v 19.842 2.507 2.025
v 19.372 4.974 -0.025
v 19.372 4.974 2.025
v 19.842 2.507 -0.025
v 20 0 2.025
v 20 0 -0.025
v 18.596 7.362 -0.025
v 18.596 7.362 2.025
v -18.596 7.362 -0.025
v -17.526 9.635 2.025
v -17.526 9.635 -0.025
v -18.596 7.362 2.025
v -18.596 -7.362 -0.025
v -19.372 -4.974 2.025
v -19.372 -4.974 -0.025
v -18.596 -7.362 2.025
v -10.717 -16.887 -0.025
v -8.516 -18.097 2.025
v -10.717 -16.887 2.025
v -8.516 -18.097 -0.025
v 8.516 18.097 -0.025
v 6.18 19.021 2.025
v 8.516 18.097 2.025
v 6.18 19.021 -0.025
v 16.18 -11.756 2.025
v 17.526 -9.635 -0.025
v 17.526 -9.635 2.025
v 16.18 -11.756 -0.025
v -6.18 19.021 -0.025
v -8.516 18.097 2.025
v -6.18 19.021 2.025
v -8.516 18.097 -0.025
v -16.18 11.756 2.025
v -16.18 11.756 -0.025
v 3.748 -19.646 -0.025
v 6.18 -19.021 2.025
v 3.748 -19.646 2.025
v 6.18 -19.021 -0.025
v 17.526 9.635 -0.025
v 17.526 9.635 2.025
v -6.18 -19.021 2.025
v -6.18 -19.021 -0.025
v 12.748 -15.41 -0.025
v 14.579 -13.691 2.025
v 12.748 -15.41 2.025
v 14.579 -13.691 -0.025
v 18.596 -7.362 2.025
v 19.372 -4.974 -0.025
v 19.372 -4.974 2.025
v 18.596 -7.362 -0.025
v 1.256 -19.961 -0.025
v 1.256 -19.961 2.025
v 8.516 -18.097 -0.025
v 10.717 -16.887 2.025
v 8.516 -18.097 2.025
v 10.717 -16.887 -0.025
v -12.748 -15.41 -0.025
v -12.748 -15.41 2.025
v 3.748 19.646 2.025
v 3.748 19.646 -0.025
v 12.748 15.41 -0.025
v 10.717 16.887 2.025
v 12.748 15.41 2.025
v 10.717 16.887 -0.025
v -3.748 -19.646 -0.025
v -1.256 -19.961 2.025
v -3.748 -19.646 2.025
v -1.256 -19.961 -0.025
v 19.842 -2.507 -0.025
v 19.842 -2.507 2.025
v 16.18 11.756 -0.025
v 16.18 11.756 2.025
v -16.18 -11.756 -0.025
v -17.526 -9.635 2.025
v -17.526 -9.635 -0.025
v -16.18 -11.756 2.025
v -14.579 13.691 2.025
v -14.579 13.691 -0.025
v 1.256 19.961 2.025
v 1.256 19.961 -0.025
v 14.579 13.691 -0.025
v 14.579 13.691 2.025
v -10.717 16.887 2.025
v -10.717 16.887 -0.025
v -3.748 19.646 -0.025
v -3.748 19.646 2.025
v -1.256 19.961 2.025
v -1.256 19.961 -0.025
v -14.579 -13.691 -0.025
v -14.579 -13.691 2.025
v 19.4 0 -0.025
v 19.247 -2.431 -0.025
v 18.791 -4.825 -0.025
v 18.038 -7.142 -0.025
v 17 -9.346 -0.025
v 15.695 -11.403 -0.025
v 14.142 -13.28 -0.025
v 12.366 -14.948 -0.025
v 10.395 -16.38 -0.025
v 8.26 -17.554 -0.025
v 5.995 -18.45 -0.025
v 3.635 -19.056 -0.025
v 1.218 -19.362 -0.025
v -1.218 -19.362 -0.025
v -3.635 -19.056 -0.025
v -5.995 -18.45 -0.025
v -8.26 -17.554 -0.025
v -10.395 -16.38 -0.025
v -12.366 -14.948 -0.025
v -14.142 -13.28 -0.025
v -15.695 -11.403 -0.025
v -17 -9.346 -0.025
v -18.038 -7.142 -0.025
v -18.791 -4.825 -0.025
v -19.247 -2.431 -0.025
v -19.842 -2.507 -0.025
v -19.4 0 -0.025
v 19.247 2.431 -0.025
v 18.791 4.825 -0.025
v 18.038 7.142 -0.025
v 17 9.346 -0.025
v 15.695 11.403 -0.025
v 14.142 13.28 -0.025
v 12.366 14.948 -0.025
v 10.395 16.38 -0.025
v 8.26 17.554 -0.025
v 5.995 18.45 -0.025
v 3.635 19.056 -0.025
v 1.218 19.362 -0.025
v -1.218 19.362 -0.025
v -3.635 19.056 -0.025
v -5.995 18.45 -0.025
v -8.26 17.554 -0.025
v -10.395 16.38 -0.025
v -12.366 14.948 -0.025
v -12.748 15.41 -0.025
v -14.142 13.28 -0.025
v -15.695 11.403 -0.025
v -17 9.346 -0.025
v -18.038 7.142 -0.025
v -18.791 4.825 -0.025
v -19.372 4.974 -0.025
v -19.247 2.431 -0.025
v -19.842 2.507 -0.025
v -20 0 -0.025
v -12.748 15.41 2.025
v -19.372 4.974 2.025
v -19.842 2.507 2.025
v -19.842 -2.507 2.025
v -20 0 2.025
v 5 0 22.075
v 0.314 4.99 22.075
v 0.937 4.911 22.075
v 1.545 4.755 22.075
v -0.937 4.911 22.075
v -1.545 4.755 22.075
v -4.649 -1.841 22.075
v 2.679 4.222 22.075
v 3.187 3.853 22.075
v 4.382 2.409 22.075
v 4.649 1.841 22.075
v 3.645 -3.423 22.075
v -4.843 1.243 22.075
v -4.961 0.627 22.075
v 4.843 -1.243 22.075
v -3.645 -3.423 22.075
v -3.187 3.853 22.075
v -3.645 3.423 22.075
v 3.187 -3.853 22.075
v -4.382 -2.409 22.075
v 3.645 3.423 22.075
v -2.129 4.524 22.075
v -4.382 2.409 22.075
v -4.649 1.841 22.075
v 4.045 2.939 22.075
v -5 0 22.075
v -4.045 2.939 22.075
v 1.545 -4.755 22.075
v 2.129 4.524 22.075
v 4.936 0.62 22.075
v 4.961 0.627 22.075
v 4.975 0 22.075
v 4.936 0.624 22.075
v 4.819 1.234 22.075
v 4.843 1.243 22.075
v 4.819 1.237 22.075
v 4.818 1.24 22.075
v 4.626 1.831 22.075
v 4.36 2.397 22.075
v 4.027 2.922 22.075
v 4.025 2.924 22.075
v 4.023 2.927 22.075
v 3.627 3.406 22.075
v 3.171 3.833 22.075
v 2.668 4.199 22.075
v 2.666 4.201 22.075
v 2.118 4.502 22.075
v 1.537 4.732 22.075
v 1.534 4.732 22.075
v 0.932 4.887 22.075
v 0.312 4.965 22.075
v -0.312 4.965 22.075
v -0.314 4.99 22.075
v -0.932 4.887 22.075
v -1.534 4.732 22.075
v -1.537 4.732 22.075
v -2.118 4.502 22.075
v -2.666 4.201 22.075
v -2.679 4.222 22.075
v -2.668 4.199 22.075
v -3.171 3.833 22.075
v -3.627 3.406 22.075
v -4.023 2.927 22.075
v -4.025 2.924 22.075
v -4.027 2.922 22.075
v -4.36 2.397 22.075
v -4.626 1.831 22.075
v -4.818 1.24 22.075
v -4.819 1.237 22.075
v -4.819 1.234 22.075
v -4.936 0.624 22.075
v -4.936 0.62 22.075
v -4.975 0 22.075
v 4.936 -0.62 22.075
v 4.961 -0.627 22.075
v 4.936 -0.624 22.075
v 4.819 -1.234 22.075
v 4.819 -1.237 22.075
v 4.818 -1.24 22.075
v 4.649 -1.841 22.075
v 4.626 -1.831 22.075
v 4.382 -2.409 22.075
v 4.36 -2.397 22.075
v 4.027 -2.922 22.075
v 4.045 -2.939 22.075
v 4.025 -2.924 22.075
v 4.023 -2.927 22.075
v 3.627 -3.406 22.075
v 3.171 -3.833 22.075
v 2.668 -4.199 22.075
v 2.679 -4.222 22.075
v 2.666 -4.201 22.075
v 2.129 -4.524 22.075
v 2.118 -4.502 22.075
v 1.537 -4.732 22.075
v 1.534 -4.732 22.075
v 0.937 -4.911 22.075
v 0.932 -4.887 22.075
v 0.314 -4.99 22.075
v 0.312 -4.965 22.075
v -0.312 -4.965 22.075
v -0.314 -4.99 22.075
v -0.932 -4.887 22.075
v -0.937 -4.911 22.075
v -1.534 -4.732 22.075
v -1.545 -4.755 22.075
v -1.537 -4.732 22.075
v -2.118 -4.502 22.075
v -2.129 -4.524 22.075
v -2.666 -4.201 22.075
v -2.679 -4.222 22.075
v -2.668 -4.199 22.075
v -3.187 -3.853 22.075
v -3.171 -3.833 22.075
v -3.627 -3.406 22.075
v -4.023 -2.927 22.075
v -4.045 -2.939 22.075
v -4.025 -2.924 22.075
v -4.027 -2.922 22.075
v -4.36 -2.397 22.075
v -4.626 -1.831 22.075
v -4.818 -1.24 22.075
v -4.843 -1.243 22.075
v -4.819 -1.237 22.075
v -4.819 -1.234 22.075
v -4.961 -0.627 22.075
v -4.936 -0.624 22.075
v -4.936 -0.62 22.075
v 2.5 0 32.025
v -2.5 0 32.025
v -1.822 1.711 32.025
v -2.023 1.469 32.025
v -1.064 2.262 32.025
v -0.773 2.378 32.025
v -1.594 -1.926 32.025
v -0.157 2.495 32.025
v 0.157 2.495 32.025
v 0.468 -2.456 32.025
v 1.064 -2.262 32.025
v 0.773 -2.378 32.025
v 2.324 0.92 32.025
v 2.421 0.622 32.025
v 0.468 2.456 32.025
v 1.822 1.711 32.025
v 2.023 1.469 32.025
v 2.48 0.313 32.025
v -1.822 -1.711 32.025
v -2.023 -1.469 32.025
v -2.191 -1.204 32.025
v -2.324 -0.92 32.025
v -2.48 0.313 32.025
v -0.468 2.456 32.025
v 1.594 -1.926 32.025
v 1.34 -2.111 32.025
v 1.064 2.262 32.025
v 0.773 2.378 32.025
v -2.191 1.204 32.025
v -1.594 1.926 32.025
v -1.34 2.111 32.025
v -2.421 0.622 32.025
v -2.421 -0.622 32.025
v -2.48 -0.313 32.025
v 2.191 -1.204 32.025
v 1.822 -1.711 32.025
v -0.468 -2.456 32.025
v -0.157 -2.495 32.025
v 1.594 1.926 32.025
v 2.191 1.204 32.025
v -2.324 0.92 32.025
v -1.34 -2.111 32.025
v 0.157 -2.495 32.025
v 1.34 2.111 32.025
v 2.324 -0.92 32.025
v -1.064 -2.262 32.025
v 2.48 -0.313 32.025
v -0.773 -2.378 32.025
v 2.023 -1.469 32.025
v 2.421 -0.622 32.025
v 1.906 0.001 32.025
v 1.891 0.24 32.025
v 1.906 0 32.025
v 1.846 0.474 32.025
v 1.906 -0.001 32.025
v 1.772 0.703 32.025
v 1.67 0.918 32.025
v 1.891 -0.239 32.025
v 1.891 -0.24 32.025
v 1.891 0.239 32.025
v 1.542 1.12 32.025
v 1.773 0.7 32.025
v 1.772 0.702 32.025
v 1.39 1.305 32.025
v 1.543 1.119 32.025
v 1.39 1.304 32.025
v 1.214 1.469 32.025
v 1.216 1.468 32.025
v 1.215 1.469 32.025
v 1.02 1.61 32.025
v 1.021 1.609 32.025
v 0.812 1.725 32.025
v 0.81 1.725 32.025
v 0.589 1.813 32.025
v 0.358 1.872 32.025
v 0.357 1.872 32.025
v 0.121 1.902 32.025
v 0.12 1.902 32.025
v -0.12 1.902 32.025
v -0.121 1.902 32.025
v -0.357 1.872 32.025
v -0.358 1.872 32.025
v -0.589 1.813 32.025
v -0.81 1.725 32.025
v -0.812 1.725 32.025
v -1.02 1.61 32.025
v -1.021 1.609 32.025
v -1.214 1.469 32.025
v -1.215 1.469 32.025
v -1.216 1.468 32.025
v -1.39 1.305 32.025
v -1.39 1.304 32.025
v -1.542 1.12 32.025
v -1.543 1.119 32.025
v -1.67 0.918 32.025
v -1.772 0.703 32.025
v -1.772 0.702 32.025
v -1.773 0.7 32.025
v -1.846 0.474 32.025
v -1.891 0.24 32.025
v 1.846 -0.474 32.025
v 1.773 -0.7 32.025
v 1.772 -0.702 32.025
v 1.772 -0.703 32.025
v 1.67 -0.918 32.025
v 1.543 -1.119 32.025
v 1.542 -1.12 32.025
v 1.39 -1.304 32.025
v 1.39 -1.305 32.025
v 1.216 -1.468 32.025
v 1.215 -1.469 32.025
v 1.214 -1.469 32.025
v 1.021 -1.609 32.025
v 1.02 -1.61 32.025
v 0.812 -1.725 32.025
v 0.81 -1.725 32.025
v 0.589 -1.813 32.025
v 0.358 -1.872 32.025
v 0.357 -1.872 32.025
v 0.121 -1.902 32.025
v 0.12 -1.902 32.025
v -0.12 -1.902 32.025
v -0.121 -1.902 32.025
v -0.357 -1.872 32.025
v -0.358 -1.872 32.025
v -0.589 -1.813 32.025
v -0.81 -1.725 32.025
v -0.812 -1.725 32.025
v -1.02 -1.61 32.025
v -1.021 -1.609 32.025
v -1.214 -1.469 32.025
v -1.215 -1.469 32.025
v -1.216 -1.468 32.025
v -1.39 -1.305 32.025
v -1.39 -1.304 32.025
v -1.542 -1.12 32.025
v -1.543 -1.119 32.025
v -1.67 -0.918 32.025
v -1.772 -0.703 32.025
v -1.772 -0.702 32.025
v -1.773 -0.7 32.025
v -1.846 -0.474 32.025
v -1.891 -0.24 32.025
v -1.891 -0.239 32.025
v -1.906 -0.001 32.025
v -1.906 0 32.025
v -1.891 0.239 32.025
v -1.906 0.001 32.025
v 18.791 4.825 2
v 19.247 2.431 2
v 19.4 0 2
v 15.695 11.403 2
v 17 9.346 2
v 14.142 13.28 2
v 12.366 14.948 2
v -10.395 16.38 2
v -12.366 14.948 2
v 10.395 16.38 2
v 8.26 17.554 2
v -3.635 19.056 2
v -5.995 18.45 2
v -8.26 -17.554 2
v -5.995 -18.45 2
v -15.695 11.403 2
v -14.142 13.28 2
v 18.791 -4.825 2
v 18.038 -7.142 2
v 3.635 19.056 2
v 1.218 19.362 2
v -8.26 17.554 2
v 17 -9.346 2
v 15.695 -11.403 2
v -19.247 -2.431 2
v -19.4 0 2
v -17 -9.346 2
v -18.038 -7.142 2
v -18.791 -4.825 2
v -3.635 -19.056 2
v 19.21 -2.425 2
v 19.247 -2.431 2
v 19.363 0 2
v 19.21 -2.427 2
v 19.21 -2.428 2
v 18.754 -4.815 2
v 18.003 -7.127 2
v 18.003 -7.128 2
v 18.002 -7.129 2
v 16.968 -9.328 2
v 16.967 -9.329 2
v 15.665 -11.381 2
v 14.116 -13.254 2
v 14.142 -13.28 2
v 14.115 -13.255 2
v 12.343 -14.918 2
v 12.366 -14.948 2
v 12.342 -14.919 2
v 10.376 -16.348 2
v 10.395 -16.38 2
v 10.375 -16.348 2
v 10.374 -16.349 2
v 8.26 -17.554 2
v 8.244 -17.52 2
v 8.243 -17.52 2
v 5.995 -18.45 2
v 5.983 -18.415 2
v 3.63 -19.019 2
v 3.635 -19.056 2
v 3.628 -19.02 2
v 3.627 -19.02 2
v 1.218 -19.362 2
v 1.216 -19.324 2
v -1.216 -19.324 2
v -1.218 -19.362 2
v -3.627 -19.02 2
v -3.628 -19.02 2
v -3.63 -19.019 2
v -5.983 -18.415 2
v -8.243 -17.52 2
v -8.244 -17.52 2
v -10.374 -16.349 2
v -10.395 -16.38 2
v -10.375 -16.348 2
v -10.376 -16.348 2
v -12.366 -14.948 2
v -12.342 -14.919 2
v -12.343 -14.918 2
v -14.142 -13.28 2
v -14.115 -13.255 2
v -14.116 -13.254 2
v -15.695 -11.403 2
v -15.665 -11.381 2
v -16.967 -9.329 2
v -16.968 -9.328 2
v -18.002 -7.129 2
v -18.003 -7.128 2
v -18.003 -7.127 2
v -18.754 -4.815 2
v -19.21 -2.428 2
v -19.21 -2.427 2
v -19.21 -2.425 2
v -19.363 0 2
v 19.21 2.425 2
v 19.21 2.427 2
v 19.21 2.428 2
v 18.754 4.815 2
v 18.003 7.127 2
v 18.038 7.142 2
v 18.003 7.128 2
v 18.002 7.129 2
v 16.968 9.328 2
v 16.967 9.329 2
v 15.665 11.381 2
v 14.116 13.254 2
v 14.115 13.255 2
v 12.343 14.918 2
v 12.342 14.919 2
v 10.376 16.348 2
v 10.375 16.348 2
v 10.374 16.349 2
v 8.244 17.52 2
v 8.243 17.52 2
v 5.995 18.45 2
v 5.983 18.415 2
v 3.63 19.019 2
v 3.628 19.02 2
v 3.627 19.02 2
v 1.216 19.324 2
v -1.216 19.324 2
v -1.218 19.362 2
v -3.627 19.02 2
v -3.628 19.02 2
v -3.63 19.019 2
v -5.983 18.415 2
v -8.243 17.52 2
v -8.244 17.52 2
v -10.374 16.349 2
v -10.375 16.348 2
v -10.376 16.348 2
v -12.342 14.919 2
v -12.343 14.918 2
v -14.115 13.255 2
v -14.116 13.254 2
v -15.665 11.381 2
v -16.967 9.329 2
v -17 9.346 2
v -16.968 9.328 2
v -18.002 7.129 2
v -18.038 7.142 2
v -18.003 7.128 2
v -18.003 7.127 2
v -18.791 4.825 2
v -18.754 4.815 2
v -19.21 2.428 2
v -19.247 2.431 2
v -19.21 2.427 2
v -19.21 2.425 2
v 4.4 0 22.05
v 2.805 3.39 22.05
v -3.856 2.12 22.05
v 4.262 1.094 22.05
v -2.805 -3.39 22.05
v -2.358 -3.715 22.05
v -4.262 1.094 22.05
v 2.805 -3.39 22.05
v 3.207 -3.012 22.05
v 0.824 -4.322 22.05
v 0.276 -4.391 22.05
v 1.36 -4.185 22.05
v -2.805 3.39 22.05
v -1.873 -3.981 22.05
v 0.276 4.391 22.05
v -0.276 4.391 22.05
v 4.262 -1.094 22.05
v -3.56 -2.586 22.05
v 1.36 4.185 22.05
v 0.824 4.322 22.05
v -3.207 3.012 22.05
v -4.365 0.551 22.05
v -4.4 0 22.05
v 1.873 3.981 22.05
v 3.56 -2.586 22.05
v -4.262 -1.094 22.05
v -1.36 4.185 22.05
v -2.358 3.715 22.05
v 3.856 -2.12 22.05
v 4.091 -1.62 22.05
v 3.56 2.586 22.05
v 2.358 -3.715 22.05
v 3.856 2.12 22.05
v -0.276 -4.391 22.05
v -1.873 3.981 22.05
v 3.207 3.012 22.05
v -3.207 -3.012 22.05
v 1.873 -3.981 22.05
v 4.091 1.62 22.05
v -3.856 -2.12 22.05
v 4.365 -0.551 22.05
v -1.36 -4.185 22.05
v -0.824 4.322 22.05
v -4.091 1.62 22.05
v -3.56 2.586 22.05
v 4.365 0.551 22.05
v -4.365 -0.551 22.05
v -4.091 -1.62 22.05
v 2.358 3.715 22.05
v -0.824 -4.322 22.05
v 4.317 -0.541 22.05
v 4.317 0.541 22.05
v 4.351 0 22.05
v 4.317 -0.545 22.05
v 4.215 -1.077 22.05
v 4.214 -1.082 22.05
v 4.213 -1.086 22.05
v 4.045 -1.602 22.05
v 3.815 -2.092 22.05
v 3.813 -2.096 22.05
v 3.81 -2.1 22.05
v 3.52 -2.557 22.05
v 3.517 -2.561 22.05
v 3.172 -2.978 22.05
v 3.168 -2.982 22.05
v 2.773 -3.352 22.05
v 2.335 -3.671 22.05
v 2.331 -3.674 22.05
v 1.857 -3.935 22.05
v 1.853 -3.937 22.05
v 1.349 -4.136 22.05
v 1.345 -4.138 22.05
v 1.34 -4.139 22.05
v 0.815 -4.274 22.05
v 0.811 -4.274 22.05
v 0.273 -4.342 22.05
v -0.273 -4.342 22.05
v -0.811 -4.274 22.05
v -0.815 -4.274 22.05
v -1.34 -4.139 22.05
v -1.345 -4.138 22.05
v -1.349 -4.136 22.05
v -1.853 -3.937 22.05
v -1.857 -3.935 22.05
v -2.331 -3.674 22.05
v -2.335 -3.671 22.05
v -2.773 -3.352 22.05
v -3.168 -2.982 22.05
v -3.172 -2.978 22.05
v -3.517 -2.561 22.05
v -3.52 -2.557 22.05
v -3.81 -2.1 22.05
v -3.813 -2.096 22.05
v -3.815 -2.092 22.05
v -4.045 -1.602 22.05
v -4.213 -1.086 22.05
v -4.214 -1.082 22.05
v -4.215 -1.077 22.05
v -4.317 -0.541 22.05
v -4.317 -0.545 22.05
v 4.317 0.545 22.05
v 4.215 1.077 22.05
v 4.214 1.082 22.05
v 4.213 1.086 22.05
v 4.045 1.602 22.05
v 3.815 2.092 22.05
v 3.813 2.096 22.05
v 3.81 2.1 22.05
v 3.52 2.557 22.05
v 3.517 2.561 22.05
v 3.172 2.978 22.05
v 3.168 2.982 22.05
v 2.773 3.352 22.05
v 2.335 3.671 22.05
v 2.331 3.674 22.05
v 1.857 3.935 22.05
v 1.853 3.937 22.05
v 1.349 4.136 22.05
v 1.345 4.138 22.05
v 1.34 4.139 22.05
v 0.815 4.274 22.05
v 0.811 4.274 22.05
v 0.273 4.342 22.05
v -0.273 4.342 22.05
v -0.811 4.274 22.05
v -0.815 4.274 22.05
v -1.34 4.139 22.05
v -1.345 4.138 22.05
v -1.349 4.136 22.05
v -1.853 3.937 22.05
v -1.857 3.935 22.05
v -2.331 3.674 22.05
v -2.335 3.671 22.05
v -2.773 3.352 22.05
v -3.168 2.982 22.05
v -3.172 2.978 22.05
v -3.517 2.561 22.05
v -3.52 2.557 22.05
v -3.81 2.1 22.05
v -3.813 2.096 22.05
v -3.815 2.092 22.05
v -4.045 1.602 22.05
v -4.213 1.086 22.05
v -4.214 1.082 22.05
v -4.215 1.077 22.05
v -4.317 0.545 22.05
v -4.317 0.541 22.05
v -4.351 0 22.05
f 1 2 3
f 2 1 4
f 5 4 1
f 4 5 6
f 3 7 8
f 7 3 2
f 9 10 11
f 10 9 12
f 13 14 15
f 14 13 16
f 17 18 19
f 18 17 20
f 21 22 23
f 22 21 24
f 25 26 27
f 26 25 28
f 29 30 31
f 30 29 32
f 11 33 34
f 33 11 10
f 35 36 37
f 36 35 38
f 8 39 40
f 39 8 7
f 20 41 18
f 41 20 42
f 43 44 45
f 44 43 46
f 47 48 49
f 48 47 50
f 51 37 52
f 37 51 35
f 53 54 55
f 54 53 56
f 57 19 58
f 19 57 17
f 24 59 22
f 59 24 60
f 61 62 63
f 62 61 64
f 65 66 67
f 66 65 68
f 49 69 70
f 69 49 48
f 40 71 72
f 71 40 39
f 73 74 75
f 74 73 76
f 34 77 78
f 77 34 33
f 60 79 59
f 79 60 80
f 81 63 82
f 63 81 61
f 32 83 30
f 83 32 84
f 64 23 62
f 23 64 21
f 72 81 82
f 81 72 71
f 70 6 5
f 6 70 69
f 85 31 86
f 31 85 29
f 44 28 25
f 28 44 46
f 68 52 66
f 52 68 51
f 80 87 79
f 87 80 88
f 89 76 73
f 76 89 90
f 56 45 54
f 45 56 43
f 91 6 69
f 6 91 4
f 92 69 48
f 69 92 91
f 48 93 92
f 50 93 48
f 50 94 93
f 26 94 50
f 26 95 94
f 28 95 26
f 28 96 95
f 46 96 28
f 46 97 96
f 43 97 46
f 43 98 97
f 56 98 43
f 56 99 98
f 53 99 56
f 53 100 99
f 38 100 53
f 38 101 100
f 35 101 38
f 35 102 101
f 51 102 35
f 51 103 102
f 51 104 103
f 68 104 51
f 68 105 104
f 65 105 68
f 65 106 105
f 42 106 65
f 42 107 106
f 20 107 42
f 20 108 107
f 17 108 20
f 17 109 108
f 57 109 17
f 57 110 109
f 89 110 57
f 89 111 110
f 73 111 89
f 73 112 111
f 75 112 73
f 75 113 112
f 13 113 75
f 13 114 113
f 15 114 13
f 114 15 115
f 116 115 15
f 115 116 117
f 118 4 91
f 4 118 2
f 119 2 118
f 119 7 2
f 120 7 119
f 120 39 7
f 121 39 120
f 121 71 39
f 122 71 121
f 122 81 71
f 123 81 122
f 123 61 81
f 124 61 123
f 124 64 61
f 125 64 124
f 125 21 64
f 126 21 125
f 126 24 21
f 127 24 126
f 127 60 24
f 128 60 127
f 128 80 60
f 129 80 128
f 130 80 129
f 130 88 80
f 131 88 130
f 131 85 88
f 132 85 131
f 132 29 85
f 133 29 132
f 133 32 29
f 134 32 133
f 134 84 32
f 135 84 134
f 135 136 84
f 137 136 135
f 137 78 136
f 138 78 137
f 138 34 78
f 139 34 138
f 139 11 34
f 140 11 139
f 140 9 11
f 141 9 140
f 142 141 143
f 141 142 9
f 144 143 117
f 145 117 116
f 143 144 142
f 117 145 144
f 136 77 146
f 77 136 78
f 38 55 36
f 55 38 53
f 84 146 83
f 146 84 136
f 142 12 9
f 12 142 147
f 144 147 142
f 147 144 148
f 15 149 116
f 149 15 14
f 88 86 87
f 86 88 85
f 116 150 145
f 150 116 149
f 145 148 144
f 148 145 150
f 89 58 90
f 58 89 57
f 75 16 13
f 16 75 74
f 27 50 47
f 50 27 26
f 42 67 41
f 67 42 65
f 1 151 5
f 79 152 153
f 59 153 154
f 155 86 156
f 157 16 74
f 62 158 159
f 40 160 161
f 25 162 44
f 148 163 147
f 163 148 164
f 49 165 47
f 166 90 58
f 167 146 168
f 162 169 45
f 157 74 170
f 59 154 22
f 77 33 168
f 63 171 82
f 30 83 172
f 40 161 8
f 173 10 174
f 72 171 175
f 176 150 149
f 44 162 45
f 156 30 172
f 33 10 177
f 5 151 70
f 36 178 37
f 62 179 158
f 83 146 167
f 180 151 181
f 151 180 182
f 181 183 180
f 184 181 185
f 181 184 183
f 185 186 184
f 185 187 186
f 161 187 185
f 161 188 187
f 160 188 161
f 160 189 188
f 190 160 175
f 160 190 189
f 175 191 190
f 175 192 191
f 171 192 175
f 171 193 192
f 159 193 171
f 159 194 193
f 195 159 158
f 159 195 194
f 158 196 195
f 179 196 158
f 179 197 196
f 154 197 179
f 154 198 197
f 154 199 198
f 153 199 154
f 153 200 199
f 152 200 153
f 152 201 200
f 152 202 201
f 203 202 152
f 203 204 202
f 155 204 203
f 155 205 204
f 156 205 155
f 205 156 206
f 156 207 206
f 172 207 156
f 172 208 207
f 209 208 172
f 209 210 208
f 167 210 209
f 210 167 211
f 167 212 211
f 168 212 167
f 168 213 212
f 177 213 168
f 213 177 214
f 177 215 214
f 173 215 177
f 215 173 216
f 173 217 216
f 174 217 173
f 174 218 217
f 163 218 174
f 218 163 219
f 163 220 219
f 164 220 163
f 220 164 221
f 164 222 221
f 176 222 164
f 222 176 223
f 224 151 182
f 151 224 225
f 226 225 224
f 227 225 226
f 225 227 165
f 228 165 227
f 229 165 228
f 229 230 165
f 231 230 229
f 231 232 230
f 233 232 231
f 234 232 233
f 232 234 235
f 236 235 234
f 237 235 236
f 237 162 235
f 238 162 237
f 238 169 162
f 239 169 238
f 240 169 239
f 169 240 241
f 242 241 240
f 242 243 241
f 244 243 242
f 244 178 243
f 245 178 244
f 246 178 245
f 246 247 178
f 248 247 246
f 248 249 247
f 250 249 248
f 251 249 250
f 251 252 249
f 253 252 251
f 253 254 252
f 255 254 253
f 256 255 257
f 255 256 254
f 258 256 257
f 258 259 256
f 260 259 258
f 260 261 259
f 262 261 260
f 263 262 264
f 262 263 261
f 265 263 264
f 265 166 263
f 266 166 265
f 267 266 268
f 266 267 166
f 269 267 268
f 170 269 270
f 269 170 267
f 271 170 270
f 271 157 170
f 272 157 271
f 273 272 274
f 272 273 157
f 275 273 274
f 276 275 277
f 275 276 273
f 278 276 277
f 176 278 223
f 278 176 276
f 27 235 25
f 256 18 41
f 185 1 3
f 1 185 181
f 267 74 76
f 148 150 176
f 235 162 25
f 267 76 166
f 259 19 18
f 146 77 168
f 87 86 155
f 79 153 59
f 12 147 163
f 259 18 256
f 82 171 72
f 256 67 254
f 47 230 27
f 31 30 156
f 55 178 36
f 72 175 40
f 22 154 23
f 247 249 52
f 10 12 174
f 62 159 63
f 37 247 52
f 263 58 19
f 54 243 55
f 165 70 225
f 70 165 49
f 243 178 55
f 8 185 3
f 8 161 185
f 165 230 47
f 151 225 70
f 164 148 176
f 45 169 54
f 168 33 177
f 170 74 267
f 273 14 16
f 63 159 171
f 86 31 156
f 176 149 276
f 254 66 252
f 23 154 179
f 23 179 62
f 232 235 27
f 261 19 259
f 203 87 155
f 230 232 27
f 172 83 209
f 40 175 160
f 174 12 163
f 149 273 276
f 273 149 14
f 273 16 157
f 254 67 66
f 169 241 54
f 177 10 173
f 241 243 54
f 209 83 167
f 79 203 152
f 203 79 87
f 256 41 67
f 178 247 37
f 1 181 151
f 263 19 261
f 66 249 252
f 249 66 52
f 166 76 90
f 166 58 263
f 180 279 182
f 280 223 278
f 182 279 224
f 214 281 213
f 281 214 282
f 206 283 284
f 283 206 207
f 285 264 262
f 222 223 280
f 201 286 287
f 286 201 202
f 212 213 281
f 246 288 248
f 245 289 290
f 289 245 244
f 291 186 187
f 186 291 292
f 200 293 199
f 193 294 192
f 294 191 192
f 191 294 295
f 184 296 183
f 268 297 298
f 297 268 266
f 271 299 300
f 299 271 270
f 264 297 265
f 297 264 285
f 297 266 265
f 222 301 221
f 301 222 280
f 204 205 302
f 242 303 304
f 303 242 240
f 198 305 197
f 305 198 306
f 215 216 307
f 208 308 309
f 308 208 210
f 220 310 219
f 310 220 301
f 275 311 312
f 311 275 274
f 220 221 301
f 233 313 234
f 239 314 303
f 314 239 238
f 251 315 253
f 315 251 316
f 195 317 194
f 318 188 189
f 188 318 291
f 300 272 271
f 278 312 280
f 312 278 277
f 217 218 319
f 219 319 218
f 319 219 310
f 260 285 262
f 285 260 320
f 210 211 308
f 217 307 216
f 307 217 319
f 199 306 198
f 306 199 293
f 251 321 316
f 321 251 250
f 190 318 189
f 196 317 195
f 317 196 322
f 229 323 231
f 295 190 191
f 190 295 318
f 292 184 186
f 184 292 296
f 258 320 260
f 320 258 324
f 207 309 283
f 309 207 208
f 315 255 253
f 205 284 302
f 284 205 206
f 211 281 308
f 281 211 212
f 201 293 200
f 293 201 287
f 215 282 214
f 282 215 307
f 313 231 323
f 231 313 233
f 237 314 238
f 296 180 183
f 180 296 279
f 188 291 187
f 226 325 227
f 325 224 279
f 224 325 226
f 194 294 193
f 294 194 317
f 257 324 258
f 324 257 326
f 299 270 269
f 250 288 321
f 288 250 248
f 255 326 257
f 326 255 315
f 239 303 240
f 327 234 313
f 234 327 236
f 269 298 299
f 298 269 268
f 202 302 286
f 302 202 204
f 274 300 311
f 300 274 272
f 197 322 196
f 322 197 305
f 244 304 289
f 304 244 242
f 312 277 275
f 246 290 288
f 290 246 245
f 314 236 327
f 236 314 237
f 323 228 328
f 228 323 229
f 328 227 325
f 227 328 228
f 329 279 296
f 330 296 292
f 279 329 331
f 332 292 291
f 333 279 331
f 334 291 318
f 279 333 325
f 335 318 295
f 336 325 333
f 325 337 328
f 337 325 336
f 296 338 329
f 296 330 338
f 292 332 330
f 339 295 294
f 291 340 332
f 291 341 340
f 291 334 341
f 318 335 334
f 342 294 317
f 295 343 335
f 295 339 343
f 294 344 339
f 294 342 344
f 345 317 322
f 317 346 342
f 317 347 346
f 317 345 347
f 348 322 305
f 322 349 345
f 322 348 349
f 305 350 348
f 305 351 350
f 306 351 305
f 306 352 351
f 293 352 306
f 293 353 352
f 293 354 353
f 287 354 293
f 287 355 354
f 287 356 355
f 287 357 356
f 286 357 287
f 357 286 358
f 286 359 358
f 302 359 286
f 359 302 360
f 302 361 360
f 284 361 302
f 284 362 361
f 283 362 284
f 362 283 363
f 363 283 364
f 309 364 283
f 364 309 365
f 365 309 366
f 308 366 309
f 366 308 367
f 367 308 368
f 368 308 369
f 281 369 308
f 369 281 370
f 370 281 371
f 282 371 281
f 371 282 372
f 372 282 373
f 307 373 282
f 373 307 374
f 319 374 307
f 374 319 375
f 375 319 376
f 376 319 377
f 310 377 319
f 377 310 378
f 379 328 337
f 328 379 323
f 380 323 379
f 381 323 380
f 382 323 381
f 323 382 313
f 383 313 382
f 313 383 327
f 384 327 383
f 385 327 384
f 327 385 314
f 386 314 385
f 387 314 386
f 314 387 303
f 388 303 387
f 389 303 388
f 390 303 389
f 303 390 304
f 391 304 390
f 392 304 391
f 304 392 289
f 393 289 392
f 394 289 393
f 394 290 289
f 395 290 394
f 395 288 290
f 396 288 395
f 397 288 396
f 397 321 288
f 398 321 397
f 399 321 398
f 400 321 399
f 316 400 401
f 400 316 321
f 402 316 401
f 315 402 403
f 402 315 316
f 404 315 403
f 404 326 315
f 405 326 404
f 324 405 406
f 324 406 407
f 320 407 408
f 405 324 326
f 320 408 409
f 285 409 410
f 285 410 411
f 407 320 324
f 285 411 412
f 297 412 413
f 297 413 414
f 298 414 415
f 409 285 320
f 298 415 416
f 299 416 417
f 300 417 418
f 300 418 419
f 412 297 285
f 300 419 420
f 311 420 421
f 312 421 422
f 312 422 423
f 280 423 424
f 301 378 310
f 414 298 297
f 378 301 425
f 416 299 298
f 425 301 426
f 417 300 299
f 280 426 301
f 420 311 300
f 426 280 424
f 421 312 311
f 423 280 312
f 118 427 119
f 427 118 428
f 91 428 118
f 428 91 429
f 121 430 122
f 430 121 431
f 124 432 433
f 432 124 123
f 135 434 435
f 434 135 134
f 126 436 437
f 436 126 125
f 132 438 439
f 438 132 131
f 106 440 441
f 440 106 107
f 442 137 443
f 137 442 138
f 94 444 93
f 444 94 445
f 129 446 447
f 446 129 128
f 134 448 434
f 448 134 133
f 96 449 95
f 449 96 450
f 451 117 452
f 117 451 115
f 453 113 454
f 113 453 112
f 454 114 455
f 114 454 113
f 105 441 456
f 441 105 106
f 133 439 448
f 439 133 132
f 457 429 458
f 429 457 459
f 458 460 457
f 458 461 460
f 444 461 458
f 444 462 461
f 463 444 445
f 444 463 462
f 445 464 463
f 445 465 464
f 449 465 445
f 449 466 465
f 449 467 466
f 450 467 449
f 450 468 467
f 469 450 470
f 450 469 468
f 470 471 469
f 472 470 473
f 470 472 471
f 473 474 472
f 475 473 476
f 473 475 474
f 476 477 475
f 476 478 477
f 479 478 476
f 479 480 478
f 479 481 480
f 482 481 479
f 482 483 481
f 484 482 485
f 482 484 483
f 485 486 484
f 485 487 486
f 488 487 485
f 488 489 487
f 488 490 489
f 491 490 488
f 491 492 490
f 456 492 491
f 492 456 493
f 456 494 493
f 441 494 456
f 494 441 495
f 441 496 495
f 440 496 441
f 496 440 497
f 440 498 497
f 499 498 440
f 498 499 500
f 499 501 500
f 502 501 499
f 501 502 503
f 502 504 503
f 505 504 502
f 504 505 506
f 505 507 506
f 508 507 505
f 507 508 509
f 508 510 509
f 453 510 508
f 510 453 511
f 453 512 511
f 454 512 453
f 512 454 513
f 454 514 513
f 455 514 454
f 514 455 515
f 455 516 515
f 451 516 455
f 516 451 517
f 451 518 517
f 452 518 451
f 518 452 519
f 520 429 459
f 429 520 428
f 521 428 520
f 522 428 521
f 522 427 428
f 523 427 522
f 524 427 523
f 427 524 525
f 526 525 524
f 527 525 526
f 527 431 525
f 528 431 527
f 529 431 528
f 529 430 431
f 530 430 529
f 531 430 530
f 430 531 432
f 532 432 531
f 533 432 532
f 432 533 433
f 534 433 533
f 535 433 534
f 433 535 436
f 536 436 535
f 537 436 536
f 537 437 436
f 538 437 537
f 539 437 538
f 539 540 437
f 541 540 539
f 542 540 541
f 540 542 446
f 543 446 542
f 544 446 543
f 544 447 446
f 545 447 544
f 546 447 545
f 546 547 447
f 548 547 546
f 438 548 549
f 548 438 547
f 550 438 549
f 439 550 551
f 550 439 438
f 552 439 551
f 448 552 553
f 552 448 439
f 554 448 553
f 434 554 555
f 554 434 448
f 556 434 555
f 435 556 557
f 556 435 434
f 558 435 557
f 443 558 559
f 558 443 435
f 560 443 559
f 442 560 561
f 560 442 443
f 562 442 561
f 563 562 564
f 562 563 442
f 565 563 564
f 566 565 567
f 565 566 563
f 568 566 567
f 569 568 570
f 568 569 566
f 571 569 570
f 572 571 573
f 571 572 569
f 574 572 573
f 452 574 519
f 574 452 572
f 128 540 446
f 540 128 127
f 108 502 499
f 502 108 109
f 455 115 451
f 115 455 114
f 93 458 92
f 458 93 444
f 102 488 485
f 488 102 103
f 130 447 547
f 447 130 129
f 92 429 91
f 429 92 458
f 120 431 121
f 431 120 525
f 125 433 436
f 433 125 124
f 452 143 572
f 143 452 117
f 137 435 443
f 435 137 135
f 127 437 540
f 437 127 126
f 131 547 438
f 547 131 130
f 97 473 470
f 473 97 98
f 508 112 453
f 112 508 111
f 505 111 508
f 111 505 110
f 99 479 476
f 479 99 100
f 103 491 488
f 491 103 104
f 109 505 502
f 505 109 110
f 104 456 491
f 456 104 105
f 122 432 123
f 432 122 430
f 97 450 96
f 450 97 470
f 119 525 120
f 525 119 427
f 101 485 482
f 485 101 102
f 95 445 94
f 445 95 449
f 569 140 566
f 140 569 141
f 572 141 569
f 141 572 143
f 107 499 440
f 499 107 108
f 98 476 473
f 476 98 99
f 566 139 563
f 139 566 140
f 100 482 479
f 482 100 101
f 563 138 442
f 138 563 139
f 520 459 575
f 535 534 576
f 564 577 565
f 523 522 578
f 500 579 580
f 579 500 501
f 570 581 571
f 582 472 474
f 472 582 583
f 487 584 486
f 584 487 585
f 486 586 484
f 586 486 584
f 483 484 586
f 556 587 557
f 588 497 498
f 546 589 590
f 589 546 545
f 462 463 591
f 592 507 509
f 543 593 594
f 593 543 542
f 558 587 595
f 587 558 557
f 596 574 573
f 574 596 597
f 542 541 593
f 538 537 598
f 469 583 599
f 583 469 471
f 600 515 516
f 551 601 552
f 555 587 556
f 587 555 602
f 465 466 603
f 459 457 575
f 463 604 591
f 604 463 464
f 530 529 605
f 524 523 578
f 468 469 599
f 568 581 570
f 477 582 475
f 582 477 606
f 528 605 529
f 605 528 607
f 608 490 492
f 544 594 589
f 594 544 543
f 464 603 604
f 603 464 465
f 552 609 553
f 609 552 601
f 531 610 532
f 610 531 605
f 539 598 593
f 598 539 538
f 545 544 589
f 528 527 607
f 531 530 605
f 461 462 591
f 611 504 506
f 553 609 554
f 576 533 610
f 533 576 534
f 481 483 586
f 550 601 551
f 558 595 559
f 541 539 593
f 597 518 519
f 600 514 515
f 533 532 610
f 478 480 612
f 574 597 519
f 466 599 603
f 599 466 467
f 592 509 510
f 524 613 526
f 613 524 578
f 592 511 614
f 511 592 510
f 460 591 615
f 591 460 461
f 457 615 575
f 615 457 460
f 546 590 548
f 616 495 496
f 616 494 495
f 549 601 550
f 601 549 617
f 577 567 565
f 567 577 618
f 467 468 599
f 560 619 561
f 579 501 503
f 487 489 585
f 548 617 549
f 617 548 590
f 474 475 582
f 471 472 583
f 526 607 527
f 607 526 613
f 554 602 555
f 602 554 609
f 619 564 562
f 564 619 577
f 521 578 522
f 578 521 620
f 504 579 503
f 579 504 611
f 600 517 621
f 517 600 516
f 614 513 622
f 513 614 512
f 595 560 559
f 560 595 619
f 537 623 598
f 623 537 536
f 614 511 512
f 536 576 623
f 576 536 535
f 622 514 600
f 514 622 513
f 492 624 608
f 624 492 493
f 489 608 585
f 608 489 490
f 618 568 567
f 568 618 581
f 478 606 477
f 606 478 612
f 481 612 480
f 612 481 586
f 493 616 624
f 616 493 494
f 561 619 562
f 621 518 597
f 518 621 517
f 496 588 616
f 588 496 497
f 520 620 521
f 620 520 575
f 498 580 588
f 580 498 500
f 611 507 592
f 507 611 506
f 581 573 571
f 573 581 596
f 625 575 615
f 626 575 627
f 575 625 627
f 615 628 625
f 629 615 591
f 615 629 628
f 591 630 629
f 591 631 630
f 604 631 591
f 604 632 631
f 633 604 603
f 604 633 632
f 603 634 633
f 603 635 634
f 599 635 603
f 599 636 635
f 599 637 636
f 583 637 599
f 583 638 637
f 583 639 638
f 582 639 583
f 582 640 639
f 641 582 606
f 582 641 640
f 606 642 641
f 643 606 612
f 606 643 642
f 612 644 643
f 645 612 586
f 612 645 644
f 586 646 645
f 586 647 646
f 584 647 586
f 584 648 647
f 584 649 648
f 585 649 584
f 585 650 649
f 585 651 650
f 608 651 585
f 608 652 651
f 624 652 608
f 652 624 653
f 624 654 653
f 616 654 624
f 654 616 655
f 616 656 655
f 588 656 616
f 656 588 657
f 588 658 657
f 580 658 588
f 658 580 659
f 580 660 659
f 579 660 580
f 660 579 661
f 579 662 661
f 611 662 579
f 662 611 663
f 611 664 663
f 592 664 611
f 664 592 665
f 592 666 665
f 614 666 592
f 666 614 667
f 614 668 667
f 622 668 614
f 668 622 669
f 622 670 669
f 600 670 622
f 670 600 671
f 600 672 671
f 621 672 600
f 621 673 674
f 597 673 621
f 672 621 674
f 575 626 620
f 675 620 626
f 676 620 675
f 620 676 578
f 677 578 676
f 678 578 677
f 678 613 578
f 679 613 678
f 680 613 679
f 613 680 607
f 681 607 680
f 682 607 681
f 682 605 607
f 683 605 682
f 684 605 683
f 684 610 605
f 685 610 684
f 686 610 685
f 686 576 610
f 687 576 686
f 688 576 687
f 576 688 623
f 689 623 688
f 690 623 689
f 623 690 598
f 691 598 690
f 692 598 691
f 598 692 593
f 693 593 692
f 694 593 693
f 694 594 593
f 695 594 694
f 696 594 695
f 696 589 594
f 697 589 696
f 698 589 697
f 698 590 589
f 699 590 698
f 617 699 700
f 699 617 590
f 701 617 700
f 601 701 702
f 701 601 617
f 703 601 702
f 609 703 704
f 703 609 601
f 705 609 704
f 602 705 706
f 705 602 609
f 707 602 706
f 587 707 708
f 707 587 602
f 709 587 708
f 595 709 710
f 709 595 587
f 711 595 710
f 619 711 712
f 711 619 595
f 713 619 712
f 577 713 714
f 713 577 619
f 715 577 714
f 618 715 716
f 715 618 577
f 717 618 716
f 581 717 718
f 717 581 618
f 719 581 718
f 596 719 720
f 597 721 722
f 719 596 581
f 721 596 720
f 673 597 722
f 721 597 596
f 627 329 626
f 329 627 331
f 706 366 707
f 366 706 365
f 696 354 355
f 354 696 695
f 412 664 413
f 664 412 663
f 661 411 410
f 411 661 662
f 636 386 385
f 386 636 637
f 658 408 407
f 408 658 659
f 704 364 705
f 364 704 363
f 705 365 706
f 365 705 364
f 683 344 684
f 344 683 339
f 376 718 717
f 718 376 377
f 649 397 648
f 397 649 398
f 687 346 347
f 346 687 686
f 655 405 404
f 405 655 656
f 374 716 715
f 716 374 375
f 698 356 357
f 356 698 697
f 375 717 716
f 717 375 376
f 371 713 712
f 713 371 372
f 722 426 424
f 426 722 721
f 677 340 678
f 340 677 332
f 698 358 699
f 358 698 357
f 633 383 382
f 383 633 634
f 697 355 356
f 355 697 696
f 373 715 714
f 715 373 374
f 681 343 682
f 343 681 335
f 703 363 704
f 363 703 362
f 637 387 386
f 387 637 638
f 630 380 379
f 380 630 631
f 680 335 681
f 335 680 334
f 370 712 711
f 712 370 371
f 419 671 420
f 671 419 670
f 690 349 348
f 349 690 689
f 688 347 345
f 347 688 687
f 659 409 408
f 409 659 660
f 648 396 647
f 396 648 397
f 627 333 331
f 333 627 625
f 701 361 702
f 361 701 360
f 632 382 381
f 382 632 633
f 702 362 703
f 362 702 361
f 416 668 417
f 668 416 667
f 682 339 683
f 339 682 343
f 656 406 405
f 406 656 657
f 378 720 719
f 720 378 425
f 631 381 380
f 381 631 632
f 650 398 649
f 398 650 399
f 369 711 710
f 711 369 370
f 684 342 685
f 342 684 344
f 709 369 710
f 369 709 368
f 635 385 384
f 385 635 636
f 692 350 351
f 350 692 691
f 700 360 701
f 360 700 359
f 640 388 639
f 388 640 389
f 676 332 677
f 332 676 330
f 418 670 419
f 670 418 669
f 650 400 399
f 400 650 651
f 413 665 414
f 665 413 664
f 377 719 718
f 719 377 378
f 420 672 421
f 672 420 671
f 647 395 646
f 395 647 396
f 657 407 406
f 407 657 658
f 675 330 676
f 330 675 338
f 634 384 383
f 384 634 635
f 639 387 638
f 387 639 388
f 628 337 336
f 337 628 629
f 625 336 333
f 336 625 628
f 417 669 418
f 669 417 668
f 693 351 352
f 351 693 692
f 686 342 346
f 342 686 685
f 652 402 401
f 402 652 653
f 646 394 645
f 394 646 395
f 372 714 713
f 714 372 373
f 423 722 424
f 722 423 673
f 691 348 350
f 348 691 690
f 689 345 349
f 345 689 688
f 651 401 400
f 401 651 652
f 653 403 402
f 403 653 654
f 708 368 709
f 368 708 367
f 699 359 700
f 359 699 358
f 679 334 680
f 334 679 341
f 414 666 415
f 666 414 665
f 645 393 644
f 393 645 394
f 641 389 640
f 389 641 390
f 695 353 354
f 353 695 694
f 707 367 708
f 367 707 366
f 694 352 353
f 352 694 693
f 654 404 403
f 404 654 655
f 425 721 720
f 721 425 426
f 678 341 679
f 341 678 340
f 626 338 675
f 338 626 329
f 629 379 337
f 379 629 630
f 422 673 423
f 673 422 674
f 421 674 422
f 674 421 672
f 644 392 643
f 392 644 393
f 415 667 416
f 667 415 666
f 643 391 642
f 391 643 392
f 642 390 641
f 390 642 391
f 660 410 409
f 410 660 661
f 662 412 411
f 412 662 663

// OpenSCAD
//copyright 2014 Richard Swika (a.k.a. Zick)
//All Rights Reserved
//Rev. Orig - Augest 19, 2014 - Good for bottom filling resin molds
//Rev. A - March 25, 2016 - Updated to work with changes to customizer
/* [Dimensions] */

//Diameter of funnel mouth? (mm)
funnelTopD = 40; //[10:200]

//Length of funnel mouth? (mm)
funnelTopL = 2; //[0:200]

//Diameter at bottom of funnel taper? (mm)
funnelBottomD = 10; //[5:200]

//Length of funnel taper? (mm)
funnelL = 20; //[10:200]

//Diameter of egress? (mm)
egressD= 5; //[5:200]

//Length of egress? (mm)
egressL = 10; //[0:200]

//Thickness of walls? (micron)
wallT = 400; //[300:5000] 

/* [Private] */
tiny=0.05;
$fn=50;
module funnel()
{
	translate([0,0,0]) 
		difference(){
		union(){
			translate([0,0,(funnelTopL)/2]) 
			cylinder(d=funnelTopD,h=funnelTopL+tiny,center=true);
			translate([0,0,tiny+funnelTopL+funnelL/2]) 
			cylinder(d1=funnelTopD,d2=funnelBottomD,h=funnelL+tiny,center=true);
			translate([0,0,funnelTopL+funnelL+egressL/2]) 
			cylinder(d1=funnelBottomD,d2=egressD,h=egressL+tiny,center=true);
		}
		translate([0,0,-tiny])
		union(){
			translate([0,0,(funnelTopL)/2]) 
			cylinder(d=funnelTopD-wallT*0.003,h=funnelTopL+2*tiny,center=true);
			translate([0,0,tiny+funnelTopL+funnelL/2]) 
			cylinder(d1=funnelTopD-wallT*0.003,d2=funnelBottomD-wallT*0.003,h=funnelL+2*tiny,center=true);
			translate([0,0,funnelTopL+funnelL+egressL/2]) 
			cylinder(d1=funnelBottomD-wallT*0.003,d2=egressD-wallT*0.003,h=egressL+4*tiny,center=true);
		}

	}
}

rotate([0,0,0]) funnel();
